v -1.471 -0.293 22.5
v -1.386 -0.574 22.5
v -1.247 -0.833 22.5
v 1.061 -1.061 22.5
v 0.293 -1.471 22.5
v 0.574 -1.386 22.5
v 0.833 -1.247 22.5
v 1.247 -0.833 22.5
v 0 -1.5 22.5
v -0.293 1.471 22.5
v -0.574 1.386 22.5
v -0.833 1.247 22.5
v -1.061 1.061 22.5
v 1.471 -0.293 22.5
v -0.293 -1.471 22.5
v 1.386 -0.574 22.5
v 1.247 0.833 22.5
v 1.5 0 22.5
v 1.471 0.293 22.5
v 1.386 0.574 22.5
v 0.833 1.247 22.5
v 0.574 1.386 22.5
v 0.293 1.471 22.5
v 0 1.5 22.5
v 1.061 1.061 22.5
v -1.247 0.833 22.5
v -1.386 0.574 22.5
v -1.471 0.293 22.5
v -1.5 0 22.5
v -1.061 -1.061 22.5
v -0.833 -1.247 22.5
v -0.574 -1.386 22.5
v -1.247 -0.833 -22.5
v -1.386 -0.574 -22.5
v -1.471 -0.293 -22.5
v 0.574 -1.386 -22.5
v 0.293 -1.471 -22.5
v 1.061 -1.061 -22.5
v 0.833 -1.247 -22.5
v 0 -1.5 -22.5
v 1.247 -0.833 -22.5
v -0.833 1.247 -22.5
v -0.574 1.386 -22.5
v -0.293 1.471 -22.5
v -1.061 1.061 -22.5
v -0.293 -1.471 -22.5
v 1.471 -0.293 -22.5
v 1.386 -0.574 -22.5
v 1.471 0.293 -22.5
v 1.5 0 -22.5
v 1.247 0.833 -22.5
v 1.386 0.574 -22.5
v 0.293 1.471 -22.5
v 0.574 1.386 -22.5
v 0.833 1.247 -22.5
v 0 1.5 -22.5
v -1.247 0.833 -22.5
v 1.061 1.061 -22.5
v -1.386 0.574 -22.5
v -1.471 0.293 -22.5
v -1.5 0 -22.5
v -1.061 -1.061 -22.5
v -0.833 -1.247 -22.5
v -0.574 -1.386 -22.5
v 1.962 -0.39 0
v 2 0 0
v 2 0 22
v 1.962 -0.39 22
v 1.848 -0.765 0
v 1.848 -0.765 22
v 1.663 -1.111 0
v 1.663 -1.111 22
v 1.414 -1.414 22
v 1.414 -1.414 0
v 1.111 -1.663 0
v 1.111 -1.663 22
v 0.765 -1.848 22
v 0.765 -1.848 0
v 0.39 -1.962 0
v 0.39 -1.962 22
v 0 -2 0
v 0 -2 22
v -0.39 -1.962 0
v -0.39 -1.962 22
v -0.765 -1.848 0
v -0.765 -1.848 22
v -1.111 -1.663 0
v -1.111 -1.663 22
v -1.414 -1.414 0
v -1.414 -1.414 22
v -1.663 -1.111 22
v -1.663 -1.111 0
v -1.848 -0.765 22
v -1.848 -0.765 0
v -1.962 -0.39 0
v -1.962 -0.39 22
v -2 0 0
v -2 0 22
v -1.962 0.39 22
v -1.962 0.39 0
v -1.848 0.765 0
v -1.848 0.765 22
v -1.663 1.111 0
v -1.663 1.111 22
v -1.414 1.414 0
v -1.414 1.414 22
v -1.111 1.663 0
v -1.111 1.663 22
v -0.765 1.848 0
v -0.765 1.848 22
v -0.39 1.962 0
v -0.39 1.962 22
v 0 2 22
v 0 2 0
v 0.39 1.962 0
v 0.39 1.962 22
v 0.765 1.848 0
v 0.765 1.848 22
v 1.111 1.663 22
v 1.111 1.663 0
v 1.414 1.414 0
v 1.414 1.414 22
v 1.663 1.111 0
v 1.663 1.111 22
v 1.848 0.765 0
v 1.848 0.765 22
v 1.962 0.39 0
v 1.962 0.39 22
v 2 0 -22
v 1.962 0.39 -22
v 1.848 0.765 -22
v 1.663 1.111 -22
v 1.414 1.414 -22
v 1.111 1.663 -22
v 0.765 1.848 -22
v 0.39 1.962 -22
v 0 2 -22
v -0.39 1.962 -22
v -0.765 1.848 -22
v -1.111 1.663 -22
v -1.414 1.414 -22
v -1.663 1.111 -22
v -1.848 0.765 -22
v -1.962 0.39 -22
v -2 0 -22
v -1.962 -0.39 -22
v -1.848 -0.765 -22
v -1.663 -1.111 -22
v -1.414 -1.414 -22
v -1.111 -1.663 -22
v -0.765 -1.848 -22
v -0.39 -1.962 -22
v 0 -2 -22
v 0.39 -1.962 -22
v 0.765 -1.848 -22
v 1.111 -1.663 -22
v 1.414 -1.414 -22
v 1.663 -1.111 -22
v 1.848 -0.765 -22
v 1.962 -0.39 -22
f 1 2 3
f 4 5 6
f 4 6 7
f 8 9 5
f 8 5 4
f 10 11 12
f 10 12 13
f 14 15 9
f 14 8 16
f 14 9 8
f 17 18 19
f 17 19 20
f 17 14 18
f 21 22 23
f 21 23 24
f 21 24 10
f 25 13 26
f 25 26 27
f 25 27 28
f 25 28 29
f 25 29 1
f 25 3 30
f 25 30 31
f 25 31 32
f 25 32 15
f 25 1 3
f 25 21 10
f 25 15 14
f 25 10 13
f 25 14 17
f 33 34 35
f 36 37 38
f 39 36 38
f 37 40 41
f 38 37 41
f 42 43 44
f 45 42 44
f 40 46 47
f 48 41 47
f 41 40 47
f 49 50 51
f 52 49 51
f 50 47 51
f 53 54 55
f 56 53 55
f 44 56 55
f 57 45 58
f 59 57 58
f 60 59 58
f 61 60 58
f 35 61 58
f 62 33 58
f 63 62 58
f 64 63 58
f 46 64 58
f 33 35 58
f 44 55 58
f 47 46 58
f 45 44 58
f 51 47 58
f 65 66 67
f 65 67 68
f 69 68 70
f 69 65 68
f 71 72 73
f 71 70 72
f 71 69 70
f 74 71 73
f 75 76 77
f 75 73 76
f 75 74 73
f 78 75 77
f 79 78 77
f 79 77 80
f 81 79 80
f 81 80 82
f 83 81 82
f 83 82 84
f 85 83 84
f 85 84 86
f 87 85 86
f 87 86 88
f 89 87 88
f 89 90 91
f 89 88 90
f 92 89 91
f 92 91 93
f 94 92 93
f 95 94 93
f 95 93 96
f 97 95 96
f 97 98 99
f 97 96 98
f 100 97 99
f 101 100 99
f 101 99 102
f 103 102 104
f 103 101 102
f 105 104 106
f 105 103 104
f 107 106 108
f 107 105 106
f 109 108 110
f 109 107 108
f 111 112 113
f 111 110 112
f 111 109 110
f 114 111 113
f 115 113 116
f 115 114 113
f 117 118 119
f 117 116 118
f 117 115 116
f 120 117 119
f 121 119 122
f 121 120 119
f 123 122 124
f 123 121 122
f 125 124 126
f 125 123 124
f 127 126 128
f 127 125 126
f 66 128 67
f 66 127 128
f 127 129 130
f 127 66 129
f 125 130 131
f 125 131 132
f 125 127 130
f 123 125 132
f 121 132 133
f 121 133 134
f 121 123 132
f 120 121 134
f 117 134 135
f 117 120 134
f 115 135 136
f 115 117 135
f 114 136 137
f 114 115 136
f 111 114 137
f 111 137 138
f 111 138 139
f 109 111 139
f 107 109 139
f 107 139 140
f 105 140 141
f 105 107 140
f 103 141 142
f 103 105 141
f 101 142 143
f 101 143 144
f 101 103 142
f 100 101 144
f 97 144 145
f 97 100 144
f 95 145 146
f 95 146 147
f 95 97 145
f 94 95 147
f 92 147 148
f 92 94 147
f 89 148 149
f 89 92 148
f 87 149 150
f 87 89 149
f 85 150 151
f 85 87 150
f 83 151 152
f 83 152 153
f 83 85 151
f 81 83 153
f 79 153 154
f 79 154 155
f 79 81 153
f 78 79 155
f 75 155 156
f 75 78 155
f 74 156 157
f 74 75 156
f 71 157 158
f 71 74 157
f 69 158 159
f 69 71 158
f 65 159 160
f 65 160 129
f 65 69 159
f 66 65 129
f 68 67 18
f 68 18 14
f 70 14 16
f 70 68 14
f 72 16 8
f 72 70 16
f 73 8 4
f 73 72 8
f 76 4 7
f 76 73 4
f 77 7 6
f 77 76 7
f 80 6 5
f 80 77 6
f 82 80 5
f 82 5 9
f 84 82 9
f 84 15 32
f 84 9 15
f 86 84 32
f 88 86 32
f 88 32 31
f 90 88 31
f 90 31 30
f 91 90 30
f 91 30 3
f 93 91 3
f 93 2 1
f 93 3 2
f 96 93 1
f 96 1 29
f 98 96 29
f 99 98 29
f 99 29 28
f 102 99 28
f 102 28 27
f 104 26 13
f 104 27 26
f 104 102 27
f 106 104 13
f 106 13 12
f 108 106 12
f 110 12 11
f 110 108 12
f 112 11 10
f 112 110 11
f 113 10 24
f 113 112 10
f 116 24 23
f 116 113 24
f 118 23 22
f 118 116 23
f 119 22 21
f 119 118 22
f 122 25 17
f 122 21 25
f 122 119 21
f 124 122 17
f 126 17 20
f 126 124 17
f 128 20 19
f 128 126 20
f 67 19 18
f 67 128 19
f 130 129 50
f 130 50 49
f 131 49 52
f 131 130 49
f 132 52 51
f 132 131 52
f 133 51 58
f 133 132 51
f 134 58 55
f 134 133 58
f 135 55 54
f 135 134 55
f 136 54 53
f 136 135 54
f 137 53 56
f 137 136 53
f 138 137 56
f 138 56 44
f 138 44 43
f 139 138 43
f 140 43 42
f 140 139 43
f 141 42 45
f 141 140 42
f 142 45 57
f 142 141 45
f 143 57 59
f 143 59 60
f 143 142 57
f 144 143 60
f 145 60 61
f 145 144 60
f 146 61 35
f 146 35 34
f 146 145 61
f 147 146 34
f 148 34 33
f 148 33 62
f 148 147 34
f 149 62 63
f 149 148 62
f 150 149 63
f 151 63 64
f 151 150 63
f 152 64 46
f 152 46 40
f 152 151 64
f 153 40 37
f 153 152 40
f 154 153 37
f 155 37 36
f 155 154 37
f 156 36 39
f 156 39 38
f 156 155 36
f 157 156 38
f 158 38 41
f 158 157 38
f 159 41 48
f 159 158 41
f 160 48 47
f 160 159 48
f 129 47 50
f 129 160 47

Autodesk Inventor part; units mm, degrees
sketch "スケッチ1" plane through (0, 0, 0) normal (0, 0, 1) x (1, 0, 0)
  circle A0 centre (0, 0) radius 2
  dimension "d0" = 4
extrude "押し出し1" add sketch "スケッチ1" along normal mid plane 45
chamfer "面取り1" distance 0.5 angle 45 1 edges at (-2, 0, 22.5)
chamfer "面取り2" distance 0.5 angle 45 1 edges at (-2, 0, -22.5)
properties part number "shaft4x45"
